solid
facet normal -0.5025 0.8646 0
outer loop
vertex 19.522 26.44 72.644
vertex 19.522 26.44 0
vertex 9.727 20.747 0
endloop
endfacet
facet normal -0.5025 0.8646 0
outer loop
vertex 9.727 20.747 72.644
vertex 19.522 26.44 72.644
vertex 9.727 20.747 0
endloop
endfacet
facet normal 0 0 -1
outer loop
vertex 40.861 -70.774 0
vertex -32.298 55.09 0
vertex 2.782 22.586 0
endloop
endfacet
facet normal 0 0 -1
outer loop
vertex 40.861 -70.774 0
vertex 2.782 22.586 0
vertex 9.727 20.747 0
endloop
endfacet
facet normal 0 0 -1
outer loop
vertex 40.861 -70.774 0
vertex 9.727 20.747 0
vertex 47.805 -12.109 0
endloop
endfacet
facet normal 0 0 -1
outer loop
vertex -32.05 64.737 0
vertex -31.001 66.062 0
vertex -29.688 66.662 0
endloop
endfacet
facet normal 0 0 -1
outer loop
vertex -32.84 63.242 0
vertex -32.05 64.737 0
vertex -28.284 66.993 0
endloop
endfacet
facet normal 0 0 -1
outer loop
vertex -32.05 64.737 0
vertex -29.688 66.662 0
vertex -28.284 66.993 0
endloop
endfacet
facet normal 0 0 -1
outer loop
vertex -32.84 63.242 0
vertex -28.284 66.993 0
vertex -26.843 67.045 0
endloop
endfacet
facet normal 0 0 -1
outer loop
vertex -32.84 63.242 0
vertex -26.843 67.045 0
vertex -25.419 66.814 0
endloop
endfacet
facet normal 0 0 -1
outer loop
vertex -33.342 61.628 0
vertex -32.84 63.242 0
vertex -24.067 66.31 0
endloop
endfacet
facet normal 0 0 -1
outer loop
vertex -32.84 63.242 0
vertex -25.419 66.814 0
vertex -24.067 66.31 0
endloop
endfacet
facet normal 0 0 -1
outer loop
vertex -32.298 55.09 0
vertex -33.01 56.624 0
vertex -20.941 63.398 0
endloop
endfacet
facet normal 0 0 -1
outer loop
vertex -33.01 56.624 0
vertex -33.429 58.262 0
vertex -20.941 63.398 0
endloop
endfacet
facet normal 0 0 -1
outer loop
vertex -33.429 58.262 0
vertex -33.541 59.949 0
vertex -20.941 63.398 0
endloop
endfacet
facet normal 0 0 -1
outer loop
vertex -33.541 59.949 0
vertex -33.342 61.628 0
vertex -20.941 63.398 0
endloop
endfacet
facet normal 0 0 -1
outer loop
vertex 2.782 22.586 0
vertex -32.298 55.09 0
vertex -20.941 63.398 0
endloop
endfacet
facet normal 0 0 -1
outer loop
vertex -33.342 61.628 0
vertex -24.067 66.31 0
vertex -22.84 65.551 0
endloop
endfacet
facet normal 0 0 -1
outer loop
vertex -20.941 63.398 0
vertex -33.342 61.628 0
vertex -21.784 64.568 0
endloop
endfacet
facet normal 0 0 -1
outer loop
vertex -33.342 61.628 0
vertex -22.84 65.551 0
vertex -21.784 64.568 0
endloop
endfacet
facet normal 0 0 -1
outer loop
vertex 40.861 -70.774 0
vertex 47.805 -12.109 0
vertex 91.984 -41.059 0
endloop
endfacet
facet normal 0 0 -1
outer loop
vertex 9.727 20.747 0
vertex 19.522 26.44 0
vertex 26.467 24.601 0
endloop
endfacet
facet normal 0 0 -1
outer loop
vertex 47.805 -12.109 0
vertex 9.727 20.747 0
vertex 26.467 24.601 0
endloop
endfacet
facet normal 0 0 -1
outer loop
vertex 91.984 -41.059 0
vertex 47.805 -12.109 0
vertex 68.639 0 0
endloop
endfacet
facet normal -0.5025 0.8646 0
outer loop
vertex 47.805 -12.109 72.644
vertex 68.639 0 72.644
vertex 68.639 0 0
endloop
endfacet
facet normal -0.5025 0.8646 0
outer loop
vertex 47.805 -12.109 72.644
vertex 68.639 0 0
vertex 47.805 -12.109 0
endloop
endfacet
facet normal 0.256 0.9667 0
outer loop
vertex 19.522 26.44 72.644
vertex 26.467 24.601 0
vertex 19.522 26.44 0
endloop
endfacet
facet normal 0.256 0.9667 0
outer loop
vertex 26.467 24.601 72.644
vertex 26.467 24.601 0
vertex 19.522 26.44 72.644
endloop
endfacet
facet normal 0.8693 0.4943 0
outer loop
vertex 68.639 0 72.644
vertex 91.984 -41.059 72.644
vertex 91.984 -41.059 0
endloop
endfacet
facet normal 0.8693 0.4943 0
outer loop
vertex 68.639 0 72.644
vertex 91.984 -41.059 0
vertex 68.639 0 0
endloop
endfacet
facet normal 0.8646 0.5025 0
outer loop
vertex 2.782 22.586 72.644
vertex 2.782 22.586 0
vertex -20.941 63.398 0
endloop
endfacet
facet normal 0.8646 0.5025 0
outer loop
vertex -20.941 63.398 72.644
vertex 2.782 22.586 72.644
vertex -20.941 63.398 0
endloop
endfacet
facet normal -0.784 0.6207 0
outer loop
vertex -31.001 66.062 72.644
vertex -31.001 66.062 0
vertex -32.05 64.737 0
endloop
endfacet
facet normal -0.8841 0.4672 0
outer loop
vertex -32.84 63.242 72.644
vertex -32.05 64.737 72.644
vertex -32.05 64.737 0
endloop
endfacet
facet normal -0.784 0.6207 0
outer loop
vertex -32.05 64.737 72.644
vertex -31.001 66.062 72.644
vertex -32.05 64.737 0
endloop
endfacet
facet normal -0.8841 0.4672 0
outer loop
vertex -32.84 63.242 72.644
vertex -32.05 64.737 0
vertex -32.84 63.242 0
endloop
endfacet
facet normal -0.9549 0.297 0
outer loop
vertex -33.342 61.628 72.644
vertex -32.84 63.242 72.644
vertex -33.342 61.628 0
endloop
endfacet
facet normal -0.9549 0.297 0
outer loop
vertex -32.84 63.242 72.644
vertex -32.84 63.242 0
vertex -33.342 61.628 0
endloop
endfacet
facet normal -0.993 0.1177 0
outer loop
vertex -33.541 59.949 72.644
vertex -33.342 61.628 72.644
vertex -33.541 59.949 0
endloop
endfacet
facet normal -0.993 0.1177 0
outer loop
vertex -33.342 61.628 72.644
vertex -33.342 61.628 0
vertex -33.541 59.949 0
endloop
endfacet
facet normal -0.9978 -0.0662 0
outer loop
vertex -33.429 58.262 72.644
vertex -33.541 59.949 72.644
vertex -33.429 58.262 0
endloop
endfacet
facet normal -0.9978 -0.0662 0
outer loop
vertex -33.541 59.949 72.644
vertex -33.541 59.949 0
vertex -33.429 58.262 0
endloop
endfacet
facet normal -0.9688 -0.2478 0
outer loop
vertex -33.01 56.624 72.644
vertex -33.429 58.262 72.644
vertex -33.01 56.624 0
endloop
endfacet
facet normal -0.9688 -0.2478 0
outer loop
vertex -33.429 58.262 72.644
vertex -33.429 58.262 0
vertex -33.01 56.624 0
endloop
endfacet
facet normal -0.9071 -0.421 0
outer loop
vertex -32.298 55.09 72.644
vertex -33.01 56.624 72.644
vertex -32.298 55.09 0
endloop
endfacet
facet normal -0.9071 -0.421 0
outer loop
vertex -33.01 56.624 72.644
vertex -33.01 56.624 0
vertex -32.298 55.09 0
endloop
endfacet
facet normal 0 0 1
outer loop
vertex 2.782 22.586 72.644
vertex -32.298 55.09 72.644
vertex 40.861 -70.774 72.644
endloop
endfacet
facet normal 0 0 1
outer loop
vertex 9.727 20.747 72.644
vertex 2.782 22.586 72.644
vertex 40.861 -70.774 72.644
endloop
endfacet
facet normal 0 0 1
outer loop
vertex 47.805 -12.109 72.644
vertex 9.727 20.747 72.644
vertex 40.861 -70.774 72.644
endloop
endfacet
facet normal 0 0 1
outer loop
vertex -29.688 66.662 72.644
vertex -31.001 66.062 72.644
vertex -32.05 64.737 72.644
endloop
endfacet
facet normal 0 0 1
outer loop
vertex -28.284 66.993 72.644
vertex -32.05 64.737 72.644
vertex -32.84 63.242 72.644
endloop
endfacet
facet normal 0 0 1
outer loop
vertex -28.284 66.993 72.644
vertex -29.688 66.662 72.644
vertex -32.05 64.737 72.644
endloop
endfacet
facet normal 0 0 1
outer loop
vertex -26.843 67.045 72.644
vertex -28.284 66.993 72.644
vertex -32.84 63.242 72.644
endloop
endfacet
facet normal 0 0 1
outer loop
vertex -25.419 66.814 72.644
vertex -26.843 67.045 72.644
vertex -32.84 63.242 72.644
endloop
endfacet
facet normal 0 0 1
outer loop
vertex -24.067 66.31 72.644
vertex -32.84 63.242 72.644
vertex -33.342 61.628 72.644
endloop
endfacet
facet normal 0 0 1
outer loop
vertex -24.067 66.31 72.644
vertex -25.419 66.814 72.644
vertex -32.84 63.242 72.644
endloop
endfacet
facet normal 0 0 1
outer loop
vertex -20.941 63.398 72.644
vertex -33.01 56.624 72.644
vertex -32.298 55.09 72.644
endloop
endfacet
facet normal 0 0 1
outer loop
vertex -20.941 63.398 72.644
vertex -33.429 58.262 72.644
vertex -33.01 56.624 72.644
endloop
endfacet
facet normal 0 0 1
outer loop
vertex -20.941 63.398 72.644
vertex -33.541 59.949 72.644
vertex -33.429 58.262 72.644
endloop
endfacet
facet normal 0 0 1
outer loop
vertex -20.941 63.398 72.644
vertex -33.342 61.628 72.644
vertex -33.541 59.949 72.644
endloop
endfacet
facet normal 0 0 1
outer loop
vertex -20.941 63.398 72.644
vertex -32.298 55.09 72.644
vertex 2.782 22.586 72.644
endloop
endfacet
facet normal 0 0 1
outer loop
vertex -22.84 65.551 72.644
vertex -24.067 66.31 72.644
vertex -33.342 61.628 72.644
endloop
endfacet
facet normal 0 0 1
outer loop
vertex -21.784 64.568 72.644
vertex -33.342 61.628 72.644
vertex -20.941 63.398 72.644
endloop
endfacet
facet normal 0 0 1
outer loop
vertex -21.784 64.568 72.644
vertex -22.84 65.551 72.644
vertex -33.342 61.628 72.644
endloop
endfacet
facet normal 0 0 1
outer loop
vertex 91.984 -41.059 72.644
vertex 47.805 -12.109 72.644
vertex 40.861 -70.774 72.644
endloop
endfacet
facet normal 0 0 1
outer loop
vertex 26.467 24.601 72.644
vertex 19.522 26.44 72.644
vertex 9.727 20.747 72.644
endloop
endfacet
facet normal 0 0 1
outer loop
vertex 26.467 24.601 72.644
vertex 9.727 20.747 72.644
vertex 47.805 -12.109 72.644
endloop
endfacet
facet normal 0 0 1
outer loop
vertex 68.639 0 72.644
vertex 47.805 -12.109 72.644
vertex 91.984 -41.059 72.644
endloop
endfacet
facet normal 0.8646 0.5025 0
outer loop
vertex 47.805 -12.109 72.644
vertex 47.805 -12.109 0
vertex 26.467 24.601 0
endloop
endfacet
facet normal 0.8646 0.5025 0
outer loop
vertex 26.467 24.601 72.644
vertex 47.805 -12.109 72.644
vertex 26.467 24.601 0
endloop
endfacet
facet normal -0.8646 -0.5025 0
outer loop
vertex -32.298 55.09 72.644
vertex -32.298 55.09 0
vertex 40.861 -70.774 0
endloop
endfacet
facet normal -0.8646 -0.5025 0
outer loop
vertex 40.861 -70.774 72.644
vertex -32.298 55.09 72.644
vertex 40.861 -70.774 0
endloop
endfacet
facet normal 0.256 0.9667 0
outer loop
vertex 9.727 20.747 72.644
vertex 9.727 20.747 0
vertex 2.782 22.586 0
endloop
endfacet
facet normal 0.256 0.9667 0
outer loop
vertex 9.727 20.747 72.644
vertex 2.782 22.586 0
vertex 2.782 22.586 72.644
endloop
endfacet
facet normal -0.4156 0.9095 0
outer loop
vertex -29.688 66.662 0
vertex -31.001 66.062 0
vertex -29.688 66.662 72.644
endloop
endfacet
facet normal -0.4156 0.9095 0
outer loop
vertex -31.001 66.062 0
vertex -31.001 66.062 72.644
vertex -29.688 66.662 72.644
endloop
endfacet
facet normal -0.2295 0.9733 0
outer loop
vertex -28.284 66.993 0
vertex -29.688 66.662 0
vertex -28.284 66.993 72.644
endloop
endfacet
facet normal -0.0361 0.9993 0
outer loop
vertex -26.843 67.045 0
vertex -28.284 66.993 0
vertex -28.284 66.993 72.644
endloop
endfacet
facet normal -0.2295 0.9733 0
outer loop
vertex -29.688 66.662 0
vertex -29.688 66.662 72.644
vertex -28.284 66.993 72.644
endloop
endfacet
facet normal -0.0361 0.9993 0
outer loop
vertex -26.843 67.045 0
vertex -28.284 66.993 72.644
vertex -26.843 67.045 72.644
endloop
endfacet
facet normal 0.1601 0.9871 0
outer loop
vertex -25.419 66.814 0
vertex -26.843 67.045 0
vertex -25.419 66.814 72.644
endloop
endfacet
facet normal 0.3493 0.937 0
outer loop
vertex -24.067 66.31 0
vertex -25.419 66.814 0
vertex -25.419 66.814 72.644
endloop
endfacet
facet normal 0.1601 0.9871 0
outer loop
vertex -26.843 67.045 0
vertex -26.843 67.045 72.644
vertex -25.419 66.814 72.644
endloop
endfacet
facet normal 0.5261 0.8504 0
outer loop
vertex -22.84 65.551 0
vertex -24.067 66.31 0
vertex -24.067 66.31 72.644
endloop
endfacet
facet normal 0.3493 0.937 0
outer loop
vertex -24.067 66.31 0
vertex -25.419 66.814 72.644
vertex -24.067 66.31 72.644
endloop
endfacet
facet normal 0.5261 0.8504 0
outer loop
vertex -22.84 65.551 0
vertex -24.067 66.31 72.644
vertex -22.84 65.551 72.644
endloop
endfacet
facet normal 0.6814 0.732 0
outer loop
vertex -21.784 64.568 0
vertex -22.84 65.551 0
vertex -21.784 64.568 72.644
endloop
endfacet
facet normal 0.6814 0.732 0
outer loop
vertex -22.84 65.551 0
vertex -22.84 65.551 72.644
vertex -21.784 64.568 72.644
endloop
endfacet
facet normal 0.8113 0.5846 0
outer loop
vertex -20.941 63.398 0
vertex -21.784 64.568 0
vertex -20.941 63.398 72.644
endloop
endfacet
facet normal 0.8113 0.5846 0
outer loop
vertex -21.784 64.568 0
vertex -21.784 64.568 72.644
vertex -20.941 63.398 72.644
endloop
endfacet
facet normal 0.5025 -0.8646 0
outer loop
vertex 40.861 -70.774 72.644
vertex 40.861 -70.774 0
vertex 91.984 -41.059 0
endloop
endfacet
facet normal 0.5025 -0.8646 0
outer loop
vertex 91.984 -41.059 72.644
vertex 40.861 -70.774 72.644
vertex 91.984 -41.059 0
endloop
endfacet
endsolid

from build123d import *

# Parameters (mm, degrees)
F1_DEPTH    = 72.644
F2_R        = 7.3585229381
F3_SIZE     = 5.08
F4_SIZE     = 5.08
F5_T1_DEPTH = 116.8137644874


# Not quite as in the source:
# - a fillet or chamfer that OpenCascade refuses, or shapes differently, is made with other operations: its cross-section is extruded or revolved along the edge and cut away or added


with BuildPart() as f1:
    # F0 (on Top) → F1 (new body)
    with BuildSketch(Plane.XY):
        Polygon((-24.6386431996, 69.7602594984), (-36.737293005, 62.7278536558), (40.861338377, -70.7739219069), (91.9838476343, -41.0586860274), (68.6385333538, 0), (47.8052062724, -12.1094844007), (23.9140867359, 28.9931332809), (5.3346716929, 18.1937474815), align=None)
    extrude(amount=F1_DEPTH)

    # F2
    f2_edges = [f1.edges().sort_by_distance(p)[0] for p in [
        (-24.638643, 69.760259, 36.322),
    ]]
    fillet(f2_edges, radius=F2_R)

    # F3
    f3_edges = [f1.edges().sort_by_distance(p)[0] for p in [
        (5.334672, 18.193747, 36.322),
    ]]
    chamfer(f3_edges, length=F3_SIZE)

    # F4
    f4_edges = [f1.edges().sort_by_distance(p)[0] for p in [
        (23.914087, 28.993133, 36.322),
    ]]
    chamfer(f4_edges, length=F4_SIZE)

    # F5: fillet of radius 9.1981536726 on 1 edges, made by hand

    # F5_s2 → F5_t1 (cut)
    with BuildSketch(Plane.XY.offset(-22.0848822437)):
        with BuildLine():
            ThreePointArc((-31.0005259261, 66.0623806462), (-33.480123973, 60.7928785055), (-32.2979662711, 55.0903735776))
            Line((-32.2979662711, 55.0903735776), (-36.737293005, 62.7278536558))
            Line((-36.737293005, 62.7278536558), (-31.0005259261, 66.0623806462))
        make_face()
    extrude(amount=F5_T1_DEPTH, mode=Mode.SUBTRACT)


solid = f1.part
